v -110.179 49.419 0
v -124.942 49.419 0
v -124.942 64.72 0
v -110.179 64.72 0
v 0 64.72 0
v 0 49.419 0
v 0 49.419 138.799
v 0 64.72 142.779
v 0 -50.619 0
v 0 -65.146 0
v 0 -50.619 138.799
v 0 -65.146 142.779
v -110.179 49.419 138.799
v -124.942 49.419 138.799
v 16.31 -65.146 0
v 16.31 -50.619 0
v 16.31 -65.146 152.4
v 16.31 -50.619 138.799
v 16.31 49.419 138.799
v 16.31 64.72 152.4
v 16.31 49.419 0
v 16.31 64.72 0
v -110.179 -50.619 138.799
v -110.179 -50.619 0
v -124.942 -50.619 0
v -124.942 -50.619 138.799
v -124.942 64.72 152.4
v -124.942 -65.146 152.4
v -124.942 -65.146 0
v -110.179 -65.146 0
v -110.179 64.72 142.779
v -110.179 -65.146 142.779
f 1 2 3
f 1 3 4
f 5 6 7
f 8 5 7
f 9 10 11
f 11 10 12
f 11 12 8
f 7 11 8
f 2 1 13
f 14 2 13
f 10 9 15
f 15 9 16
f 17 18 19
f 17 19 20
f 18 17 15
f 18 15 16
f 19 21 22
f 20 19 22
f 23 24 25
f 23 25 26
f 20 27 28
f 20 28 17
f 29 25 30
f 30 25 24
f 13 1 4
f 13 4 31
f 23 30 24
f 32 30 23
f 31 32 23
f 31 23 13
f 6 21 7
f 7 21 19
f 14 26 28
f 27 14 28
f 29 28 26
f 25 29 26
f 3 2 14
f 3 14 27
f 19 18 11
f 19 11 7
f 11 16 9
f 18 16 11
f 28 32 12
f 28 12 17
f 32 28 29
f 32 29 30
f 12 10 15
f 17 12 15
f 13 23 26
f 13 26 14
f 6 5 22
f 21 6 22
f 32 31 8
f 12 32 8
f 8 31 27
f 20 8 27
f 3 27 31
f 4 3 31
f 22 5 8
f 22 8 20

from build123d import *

# Parameters (mm, degrees)
F0_W     = 141.25201
F0_H     = 129.866399
F1_DEPTH = 152.4
F2_W     = 110.178575
F2_H     = 142.77944
F3_DEPTH = 152.4
F4_W     = 100.038202
F4_H     = 138.79922
F5_DEPTH = 152.4


with BuildPart() as f1:
    # F0 (on Top) → F1 (new body)
    with BuildSketch(Plane.XY):
        with Locations((-54.315851, -0.212978)):
            Rectangle(F0_W, F0_H)
    extrude(amount=F1_DEPTH)

    # F2 (on face) → F3 (cut)
    with BuildSketch(Plane.XZ.offset(65.146178)):
        with Locations((-55.089287, 71.38972)):
            Rectangle(F2_W, F2_H)
    extrude(amount=-F3_DEPTH, mode=Mode.SUBTRACT)

    # F4 (on face) → F5 (cut)
    with BuildSketch(Plane.YZ.offset(16.310154)):
        with Locations((-0.600052, 69.39961)):
            Rectangle(F4_W, F4_H)
    extrude(amount=-F5_DEPTH, mode=Mode.SUBTRACT)


solid = f1.part
